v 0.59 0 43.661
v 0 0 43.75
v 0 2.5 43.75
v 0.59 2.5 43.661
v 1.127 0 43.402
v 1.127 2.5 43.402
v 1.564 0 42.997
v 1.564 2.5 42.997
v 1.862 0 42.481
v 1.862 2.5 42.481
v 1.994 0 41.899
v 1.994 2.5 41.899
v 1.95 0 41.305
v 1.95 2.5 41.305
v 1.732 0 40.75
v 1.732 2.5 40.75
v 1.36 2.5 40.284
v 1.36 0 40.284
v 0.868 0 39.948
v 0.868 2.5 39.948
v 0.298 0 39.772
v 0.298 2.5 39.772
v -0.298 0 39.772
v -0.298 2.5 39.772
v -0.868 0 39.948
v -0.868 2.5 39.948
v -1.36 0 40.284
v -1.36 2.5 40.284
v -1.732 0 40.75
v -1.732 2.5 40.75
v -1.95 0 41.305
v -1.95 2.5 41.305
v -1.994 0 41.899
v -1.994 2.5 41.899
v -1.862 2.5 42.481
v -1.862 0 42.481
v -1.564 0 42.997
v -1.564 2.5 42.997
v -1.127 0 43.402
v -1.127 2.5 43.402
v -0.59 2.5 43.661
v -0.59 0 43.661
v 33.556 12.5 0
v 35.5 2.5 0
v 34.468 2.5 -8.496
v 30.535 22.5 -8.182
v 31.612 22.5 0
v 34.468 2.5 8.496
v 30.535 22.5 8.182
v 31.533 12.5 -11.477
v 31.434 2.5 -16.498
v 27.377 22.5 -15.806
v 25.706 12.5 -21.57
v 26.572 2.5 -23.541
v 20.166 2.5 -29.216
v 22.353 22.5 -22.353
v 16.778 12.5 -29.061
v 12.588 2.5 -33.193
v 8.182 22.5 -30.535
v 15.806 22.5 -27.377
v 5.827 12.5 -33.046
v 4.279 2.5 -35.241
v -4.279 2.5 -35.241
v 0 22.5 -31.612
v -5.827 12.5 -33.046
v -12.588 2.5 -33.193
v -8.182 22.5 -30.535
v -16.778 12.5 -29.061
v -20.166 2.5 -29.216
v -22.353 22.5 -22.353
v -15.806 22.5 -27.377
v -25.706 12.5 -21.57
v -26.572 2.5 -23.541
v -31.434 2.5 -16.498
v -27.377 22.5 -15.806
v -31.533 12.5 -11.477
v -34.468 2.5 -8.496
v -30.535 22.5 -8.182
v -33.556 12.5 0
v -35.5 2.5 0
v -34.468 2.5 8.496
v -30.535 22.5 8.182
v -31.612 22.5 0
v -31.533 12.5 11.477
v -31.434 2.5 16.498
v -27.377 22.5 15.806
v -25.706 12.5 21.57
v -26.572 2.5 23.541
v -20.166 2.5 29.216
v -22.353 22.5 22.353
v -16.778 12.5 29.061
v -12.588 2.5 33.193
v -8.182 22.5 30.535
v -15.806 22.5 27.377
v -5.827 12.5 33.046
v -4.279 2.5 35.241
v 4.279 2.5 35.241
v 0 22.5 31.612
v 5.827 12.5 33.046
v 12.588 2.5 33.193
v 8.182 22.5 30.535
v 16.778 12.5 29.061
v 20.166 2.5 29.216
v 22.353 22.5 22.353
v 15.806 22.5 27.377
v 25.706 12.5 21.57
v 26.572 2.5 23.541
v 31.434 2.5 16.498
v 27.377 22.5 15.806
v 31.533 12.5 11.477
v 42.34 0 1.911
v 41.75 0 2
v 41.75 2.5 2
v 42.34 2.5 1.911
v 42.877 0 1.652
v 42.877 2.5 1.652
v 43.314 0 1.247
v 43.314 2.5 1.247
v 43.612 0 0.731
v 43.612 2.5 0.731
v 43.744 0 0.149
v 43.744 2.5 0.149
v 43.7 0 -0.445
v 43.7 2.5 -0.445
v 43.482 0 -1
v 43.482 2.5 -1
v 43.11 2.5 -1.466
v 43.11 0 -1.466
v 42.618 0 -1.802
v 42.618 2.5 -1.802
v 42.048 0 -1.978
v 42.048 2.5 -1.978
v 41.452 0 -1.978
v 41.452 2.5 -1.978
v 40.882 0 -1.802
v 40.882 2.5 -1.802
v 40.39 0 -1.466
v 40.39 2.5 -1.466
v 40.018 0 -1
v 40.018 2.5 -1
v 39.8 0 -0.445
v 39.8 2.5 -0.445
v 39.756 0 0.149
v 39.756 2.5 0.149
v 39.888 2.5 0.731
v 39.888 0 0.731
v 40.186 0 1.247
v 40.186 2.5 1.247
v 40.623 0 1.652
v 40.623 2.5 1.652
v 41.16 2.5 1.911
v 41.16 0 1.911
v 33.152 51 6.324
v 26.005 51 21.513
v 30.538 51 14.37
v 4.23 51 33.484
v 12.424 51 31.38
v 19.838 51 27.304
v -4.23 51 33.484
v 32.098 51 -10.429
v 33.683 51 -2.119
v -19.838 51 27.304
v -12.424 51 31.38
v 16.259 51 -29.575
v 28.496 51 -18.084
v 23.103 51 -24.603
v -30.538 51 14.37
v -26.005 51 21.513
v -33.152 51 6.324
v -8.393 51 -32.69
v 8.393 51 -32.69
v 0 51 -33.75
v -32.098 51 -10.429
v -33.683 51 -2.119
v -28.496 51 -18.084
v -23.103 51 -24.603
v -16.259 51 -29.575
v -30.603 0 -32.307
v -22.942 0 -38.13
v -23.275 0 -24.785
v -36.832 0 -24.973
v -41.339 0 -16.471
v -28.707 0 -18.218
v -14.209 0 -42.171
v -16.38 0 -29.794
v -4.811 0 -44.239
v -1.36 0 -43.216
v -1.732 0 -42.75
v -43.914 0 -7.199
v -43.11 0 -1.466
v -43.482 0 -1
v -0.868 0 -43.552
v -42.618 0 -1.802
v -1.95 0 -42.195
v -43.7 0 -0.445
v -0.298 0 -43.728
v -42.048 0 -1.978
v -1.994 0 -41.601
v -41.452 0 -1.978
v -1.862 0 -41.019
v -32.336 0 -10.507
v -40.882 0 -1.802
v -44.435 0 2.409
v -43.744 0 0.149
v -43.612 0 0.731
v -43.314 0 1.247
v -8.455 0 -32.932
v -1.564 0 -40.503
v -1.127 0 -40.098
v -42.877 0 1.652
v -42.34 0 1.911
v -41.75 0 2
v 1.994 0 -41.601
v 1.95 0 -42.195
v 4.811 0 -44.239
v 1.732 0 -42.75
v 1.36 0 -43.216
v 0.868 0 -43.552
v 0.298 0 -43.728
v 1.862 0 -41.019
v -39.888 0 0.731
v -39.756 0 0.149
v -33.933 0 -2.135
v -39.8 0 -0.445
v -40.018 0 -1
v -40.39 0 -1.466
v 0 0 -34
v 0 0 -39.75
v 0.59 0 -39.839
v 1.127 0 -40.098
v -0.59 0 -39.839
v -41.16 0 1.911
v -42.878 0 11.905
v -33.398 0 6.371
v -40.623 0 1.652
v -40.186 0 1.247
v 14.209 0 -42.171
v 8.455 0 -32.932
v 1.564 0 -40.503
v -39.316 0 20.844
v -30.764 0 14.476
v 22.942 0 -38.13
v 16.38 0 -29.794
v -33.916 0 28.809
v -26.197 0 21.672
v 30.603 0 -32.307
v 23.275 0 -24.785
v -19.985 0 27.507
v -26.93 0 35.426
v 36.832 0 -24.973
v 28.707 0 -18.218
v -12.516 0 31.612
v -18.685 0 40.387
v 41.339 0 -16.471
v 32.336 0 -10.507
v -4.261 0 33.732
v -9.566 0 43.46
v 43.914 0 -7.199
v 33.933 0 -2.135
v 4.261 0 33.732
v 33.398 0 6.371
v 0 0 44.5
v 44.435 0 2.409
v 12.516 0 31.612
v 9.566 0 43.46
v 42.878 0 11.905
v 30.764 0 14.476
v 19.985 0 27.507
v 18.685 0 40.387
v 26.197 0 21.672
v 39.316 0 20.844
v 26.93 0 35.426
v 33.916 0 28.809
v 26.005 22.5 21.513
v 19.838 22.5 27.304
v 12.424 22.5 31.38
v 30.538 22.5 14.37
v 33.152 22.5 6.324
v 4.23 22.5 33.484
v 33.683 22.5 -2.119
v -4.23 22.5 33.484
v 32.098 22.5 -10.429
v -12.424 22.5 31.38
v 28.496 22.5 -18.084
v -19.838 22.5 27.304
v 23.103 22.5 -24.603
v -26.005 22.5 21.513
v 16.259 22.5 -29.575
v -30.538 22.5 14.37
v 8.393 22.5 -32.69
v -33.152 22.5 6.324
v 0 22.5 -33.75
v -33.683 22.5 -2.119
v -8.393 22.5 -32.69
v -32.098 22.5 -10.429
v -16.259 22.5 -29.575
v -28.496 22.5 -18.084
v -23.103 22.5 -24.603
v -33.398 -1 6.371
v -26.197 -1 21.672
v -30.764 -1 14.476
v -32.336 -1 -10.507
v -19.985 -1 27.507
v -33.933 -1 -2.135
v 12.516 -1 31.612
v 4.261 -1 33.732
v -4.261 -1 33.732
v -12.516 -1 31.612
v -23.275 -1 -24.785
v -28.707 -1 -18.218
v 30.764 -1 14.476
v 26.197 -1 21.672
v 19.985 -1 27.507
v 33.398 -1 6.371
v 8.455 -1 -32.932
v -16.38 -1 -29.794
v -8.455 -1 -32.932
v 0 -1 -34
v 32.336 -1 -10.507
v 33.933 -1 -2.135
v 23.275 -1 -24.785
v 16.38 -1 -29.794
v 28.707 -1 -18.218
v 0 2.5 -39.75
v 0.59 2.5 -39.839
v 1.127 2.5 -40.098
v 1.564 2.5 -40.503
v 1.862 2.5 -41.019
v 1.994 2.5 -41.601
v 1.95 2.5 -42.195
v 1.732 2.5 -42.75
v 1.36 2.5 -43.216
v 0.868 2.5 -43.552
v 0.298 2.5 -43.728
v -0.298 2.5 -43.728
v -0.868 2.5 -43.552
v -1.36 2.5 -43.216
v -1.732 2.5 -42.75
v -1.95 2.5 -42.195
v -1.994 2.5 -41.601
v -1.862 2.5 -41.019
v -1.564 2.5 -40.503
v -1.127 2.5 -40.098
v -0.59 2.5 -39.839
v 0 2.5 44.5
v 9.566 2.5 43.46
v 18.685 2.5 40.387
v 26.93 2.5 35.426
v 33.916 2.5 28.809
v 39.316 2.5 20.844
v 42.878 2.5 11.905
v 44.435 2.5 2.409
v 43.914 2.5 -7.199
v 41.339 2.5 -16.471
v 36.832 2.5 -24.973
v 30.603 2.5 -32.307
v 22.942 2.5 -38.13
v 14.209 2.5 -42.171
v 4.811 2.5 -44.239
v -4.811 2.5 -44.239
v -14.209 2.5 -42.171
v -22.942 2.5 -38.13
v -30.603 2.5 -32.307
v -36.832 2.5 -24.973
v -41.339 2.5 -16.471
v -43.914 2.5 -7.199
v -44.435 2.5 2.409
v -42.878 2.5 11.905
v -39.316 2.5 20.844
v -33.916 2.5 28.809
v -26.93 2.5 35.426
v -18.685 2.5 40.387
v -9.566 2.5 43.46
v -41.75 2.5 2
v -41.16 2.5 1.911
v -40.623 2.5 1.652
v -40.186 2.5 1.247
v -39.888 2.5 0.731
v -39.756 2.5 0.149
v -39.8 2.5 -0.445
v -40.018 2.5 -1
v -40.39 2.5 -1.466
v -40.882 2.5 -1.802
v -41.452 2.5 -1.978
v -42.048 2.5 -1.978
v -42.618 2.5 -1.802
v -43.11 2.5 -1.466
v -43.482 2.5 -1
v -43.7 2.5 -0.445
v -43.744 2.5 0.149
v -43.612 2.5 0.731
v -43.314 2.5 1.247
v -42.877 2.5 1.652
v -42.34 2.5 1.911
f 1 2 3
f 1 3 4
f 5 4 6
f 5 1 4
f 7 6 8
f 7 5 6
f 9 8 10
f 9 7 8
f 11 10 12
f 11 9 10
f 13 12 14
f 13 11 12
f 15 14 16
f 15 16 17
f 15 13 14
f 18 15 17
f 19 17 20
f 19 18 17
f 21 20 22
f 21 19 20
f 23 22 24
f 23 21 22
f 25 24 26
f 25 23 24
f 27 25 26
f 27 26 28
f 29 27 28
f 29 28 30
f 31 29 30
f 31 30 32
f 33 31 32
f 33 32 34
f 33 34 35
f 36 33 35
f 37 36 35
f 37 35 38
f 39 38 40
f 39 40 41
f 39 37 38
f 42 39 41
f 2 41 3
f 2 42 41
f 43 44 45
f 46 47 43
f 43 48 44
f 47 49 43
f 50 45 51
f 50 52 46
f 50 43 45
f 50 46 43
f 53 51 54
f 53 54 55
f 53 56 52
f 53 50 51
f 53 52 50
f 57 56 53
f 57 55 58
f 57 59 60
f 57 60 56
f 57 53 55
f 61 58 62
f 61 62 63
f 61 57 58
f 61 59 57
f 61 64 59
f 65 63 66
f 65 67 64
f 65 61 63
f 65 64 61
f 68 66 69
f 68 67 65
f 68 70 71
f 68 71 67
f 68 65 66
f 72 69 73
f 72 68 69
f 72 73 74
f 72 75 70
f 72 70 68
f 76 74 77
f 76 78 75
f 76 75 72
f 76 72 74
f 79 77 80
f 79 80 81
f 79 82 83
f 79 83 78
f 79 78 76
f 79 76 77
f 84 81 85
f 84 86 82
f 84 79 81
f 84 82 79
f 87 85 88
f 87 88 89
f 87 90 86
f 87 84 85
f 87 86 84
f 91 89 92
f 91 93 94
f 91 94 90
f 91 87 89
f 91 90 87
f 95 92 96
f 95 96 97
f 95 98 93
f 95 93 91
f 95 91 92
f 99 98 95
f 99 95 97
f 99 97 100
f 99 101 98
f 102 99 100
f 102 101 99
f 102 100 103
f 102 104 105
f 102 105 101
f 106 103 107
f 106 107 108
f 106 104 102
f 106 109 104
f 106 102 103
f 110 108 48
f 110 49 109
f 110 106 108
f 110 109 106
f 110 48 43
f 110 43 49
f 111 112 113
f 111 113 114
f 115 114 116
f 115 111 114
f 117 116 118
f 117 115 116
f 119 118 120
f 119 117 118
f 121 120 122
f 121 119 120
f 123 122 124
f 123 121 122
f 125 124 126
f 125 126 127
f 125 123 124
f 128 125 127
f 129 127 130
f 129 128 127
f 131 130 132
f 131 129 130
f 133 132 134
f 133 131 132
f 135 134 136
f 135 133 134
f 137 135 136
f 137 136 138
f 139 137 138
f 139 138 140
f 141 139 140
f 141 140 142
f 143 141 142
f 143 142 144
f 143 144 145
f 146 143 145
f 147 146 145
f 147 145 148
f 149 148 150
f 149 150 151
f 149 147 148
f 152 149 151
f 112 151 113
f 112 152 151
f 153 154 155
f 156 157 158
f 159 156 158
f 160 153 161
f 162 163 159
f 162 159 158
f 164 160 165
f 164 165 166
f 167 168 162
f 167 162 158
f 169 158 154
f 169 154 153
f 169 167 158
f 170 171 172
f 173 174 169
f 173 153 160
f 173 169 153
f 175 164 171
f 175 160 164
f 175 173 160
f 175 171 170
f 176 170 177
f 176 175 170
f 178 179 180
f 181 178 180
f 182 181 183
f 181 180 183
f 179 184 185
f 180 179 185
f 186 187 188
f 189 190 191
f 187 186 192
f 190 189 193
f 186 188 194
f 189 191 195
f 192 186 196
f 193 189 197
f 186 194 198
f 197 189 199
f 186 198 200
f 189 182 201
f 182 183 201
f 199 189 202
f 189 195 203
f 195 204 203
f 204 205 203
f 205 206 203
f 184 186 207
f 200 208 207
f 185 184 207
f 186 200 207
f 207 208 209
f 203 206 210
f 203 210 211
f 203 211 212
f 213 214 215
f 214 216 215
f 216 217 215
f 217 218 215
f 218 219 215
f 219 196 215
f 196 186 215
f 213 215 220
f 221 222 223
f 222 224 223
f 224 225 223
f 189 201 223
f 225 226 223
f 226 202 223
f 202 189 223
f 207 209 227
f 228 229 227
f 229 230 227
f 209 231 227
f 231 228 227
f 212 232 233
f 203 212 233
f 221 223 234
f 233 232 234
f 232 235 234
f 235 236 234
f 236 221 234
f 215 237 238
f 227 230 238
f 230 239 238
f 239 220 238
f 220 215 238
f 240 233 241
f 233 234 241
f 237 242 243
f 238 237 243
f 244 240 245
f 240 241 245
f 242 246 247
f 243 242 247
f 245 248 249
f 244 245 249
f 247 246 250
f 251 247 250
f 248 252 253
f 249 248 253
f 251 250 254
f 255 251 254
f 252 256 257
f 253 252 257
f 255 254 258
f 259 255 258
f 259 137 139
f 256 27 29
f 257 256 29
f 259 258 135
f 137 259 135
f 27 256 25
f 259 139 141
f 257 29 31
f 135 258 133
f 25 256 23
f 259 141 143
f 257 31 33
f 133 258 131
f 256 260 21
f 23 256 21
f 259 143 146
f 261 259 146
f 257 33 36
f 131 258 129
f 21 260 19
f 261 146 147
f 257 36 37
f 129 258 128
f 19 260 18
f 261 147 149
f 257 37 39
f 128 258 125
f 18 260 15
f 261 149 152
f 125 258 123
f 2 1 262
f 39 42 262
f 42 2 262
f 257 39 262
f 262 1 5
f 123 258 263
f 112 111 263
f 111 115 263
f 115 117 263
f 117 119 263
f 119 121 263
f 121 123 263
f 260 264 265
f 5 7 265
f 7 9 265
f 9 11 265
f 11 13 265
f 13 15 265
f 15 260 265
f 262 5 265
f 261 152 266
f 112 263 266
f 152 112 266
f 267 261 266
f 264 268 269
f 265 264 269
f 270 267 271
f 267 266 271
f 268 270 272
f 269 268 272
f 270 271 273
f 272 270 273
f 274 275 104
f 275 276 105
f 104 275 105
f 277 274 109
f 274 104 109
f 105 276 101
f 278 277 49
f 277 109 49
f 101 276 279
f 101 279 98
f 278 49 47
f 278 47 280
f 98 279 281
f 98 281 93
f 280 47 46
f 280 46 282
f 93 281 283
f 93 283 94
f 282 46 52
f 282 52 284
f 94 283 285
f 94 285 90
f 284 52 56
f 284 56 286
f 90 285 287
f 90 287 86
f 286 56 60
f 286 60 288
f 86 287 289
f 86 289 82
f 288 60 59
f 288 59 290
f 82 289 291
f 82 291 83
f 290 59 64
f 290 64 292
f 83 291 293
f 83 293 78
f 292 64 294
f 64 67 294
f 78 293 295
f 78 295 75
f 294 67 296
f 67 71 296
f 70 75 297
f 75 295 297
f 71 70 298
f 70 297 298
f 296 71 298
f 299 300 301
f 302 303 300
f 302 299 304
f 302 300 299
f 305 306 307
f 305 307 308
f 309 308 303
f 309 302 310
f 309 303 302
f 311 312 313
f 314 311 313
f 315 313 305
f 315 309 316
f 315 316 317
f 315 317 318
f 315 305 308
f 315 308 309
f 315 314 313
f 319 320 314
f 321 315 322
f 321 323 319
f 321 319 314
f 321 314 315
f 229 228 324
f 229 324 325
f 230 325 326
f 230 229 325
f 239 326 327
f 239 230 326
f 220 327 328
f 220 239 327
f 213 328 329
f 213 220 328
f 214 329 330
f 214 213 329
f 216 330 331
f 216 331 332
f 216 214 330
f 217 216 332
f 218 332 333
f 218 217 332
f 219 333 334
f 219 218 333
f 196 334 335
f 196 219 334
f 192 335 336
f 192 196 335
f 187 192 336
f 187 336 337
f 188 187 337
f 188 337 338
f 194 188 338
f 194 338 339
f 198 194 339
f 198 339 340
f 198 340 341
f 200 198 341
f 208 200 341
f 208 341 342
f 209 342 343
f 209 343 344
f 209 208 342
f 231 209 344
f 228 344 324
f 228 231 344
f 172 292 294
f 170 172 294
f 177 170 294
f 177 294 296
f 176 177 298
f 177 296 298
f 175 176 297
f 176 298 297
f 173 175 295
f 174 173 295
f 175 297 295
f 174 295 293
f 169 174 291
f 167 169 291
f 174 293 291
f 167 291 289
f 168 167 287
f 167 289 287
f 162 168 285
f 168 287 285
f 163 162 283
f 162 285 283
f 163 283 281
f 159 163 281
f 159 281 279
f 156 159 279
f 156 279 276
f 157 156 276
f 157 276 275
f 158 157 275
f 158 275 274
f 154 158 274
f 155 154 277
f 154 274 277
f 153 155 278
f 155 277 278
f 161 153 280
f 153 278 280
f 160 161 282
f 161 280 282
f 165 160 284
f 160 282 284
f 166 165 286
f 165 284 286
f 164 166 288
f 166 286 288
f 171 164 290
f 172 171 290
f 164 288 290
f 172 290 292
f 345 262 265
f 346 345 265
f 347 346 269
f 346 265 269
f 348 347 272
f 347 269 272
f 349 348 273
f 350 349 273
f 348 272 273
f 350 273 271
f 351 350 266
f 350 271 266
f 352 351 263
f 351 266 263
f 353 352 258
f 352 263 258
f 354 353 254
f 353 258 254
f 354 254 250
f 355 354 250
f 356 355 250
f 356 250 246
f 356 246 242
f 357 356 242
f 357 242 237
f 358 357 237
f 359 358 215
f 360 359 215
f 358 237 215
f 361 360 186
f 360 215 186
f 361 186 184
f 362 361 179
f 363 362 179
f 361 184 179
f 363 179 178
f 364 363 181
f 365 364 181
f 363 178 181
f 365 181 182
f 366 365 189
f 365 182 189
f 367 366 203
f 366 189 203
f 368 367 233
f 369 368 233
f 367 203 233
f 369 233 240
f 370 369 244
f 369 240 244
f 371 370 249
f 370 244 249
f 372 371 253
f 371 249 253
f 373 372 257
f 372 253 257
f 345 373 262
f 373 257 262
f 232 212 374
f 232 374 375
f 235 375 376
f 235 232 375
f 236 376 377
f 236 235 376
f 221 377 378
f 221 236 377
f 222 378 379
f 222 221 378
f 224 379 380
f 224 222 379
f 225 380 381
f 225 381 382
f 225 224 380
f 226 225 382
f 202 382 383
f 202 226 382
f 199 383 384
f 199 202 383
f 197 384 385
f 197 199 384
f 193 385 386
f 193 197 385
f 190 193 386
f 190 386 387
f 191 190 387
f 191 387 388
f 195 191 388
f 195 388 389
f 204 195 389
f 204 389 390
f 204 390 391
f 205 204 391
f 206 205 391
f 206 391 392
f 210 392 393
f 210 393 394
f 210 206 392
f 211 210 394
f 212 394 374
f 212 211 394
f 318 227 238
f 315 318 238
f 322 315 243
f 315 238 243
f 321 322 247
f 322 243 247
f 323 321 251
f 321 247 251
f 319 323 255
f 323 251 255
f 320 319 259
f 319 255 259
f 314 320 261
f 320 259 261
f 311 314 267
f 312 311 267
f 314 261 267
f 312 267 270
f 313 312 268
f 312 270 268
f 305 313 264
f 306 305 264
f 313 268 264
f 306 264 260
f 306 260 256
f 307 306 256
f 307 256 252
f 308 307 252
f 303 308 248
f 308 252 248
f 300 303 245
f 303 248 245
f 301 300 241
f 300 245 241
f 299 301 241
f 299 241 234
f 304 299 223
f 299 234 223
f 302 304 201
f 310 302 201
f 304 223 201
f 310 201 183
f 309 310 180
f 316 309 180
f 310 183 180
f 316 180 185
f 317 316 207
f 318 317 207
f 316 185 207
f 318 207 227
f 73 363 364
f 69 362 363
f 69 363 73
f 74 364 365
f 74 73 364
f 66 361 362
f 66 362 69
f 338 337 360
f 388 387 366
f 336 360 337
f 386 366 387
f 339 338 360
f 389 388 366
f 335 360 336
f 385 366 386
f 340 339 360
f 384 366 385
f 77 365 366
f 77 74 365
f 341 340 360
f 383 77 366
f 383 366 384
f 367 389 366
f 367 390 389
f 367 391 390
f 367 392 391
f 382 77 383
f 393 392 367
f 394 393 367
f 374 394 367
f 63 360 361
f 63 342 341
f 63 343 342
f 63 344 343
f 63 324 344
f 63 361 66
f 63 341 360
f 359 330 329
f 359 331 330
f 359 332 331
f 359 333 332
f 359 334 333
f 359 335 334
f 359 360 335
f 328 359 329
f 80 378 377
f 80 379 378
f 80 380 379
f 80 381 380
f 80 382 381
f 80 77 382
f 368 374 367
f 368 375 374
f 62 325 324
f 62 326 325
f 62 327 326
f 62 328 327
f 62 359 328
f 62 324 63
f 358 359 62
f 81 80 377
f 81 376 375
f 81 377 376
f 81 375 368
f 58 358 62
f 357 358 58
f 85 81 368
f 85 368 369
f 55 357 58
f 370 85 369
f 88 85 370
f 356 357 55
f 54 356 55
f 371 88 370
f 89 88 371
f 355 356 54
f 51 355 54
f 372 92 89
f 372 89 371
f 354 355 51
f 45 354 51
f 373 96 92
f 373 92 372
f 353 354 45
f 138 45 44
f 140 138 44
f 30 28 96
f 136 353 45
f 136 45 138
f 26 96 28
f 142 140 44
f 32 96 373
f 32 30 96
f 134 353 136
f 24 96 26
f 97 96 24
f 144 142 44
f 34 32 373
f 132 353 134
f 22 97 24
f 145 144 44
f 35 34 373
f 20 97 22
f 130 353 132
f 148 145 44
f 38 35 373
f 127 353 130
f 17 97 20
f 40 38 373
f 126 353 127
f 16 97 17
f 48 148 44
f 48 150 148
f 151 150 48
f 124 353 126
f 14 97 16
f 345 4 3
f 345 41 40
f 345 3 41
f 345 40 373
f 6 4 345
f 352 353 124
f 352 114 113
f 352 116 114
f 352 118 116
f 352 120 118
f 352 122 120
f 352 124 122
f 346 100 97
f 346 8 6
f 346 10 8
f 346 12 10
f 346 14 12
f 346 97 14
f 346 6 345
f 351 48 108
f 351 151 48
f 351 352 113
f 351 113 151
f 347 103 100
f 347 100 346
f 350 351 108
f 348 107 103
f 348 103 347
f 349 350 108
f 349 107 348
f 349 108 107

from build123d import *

# Parameters (mm, degrees)
SKETCH1_R           = 44.5
SKETCH1_R_2         = 2
BOSS_EXTRUDE1_DEPTH = 2.5
SKETCH2_R           = 34
BOSS_EXTRUDE2_DEPTH = 1
SKETCH3_R           = 35.5
BOSS_EXTRUDE3_DEPTH = 20
BOSS_EXTRUDE3_TAPER = 11
SKETCH4_R           = 33.75
BOSS_EXTRUDE4_DEPTH = 28.5


with BuildPart() as part:
    # Sketch1 → Boss-Extrude1 (new body)
    with BuildSketch(Plane(origin=(0, 0, 0), x_dir=(1, 0, 0), z_dir=(0, 1, 0))):
        with Locations(Location((0, 0, 0), (0, 0, 270))):
            Circle(SKETCH1_R)
        with Locations(Location((0, 41.75, 0), (0, 0, 270))):
            Circle(SKETCH1_R_2, mode=Mode.SUBTRACT)
        with Locations(Location((41.75, 0, 0), (0, 0, 270))):
            Circle(SKETCH1_R_2, mode=Mode.SUBTRACT)
        with Locations(Location((0, -41.75, 0), (0, 0, 270))):
            Circle(SKETCH1_R_2, mode=Mode.SUBTRACT)
        with Locations(Location((-41.75, 0, 0), (0, 0, 270))):
            Circle(SKETCH1_R_2, mode=Mode.SUBTRACT)
    extrude(amount=BOSS_EXTRUDE1_DEPTH)

    # Sketch2 → Boss-Extrude2 (add)
    with BuildSketch(Plane(origin=(0, 0, 0), x_dir=(-1, 0, 0), z_dir=(0, -1, 0))):
        with Locations(Location((0, 0, 0), (0, 0, 90))):
            Circle(SKETCH2_R)
    extrude(amount=BOSS_EXTRUDE2_DEPTH)

    # Sketch3 → Boss-Extrude3 (add)
    with BuildSketch(Plane(origin=(0, 2.5, 0), x_dir=(1, 0, 0), z_dir=(0, 1, 0))):
        Circle(SKETCH3_R)
    extrude(amount=BOSS_EXTRUDE3_DEPTH, taper=BOSS_EXTRUDE3_TAPER)

    # Sketch4 → Boss-Extrude4 (add)
    with BuildSketch(Plane(origin=(0, 22.5, 0), x_dir=(1, 0, 0), z_dir=(0, 1, 0))):
        with Locations(Location((0, 0, 0), (0, 0, 90))):
            Circle(SKETCH4_R)
    extrude(amount=BOSS_EXTRUDE4_DEPTH)


solid = part.part
